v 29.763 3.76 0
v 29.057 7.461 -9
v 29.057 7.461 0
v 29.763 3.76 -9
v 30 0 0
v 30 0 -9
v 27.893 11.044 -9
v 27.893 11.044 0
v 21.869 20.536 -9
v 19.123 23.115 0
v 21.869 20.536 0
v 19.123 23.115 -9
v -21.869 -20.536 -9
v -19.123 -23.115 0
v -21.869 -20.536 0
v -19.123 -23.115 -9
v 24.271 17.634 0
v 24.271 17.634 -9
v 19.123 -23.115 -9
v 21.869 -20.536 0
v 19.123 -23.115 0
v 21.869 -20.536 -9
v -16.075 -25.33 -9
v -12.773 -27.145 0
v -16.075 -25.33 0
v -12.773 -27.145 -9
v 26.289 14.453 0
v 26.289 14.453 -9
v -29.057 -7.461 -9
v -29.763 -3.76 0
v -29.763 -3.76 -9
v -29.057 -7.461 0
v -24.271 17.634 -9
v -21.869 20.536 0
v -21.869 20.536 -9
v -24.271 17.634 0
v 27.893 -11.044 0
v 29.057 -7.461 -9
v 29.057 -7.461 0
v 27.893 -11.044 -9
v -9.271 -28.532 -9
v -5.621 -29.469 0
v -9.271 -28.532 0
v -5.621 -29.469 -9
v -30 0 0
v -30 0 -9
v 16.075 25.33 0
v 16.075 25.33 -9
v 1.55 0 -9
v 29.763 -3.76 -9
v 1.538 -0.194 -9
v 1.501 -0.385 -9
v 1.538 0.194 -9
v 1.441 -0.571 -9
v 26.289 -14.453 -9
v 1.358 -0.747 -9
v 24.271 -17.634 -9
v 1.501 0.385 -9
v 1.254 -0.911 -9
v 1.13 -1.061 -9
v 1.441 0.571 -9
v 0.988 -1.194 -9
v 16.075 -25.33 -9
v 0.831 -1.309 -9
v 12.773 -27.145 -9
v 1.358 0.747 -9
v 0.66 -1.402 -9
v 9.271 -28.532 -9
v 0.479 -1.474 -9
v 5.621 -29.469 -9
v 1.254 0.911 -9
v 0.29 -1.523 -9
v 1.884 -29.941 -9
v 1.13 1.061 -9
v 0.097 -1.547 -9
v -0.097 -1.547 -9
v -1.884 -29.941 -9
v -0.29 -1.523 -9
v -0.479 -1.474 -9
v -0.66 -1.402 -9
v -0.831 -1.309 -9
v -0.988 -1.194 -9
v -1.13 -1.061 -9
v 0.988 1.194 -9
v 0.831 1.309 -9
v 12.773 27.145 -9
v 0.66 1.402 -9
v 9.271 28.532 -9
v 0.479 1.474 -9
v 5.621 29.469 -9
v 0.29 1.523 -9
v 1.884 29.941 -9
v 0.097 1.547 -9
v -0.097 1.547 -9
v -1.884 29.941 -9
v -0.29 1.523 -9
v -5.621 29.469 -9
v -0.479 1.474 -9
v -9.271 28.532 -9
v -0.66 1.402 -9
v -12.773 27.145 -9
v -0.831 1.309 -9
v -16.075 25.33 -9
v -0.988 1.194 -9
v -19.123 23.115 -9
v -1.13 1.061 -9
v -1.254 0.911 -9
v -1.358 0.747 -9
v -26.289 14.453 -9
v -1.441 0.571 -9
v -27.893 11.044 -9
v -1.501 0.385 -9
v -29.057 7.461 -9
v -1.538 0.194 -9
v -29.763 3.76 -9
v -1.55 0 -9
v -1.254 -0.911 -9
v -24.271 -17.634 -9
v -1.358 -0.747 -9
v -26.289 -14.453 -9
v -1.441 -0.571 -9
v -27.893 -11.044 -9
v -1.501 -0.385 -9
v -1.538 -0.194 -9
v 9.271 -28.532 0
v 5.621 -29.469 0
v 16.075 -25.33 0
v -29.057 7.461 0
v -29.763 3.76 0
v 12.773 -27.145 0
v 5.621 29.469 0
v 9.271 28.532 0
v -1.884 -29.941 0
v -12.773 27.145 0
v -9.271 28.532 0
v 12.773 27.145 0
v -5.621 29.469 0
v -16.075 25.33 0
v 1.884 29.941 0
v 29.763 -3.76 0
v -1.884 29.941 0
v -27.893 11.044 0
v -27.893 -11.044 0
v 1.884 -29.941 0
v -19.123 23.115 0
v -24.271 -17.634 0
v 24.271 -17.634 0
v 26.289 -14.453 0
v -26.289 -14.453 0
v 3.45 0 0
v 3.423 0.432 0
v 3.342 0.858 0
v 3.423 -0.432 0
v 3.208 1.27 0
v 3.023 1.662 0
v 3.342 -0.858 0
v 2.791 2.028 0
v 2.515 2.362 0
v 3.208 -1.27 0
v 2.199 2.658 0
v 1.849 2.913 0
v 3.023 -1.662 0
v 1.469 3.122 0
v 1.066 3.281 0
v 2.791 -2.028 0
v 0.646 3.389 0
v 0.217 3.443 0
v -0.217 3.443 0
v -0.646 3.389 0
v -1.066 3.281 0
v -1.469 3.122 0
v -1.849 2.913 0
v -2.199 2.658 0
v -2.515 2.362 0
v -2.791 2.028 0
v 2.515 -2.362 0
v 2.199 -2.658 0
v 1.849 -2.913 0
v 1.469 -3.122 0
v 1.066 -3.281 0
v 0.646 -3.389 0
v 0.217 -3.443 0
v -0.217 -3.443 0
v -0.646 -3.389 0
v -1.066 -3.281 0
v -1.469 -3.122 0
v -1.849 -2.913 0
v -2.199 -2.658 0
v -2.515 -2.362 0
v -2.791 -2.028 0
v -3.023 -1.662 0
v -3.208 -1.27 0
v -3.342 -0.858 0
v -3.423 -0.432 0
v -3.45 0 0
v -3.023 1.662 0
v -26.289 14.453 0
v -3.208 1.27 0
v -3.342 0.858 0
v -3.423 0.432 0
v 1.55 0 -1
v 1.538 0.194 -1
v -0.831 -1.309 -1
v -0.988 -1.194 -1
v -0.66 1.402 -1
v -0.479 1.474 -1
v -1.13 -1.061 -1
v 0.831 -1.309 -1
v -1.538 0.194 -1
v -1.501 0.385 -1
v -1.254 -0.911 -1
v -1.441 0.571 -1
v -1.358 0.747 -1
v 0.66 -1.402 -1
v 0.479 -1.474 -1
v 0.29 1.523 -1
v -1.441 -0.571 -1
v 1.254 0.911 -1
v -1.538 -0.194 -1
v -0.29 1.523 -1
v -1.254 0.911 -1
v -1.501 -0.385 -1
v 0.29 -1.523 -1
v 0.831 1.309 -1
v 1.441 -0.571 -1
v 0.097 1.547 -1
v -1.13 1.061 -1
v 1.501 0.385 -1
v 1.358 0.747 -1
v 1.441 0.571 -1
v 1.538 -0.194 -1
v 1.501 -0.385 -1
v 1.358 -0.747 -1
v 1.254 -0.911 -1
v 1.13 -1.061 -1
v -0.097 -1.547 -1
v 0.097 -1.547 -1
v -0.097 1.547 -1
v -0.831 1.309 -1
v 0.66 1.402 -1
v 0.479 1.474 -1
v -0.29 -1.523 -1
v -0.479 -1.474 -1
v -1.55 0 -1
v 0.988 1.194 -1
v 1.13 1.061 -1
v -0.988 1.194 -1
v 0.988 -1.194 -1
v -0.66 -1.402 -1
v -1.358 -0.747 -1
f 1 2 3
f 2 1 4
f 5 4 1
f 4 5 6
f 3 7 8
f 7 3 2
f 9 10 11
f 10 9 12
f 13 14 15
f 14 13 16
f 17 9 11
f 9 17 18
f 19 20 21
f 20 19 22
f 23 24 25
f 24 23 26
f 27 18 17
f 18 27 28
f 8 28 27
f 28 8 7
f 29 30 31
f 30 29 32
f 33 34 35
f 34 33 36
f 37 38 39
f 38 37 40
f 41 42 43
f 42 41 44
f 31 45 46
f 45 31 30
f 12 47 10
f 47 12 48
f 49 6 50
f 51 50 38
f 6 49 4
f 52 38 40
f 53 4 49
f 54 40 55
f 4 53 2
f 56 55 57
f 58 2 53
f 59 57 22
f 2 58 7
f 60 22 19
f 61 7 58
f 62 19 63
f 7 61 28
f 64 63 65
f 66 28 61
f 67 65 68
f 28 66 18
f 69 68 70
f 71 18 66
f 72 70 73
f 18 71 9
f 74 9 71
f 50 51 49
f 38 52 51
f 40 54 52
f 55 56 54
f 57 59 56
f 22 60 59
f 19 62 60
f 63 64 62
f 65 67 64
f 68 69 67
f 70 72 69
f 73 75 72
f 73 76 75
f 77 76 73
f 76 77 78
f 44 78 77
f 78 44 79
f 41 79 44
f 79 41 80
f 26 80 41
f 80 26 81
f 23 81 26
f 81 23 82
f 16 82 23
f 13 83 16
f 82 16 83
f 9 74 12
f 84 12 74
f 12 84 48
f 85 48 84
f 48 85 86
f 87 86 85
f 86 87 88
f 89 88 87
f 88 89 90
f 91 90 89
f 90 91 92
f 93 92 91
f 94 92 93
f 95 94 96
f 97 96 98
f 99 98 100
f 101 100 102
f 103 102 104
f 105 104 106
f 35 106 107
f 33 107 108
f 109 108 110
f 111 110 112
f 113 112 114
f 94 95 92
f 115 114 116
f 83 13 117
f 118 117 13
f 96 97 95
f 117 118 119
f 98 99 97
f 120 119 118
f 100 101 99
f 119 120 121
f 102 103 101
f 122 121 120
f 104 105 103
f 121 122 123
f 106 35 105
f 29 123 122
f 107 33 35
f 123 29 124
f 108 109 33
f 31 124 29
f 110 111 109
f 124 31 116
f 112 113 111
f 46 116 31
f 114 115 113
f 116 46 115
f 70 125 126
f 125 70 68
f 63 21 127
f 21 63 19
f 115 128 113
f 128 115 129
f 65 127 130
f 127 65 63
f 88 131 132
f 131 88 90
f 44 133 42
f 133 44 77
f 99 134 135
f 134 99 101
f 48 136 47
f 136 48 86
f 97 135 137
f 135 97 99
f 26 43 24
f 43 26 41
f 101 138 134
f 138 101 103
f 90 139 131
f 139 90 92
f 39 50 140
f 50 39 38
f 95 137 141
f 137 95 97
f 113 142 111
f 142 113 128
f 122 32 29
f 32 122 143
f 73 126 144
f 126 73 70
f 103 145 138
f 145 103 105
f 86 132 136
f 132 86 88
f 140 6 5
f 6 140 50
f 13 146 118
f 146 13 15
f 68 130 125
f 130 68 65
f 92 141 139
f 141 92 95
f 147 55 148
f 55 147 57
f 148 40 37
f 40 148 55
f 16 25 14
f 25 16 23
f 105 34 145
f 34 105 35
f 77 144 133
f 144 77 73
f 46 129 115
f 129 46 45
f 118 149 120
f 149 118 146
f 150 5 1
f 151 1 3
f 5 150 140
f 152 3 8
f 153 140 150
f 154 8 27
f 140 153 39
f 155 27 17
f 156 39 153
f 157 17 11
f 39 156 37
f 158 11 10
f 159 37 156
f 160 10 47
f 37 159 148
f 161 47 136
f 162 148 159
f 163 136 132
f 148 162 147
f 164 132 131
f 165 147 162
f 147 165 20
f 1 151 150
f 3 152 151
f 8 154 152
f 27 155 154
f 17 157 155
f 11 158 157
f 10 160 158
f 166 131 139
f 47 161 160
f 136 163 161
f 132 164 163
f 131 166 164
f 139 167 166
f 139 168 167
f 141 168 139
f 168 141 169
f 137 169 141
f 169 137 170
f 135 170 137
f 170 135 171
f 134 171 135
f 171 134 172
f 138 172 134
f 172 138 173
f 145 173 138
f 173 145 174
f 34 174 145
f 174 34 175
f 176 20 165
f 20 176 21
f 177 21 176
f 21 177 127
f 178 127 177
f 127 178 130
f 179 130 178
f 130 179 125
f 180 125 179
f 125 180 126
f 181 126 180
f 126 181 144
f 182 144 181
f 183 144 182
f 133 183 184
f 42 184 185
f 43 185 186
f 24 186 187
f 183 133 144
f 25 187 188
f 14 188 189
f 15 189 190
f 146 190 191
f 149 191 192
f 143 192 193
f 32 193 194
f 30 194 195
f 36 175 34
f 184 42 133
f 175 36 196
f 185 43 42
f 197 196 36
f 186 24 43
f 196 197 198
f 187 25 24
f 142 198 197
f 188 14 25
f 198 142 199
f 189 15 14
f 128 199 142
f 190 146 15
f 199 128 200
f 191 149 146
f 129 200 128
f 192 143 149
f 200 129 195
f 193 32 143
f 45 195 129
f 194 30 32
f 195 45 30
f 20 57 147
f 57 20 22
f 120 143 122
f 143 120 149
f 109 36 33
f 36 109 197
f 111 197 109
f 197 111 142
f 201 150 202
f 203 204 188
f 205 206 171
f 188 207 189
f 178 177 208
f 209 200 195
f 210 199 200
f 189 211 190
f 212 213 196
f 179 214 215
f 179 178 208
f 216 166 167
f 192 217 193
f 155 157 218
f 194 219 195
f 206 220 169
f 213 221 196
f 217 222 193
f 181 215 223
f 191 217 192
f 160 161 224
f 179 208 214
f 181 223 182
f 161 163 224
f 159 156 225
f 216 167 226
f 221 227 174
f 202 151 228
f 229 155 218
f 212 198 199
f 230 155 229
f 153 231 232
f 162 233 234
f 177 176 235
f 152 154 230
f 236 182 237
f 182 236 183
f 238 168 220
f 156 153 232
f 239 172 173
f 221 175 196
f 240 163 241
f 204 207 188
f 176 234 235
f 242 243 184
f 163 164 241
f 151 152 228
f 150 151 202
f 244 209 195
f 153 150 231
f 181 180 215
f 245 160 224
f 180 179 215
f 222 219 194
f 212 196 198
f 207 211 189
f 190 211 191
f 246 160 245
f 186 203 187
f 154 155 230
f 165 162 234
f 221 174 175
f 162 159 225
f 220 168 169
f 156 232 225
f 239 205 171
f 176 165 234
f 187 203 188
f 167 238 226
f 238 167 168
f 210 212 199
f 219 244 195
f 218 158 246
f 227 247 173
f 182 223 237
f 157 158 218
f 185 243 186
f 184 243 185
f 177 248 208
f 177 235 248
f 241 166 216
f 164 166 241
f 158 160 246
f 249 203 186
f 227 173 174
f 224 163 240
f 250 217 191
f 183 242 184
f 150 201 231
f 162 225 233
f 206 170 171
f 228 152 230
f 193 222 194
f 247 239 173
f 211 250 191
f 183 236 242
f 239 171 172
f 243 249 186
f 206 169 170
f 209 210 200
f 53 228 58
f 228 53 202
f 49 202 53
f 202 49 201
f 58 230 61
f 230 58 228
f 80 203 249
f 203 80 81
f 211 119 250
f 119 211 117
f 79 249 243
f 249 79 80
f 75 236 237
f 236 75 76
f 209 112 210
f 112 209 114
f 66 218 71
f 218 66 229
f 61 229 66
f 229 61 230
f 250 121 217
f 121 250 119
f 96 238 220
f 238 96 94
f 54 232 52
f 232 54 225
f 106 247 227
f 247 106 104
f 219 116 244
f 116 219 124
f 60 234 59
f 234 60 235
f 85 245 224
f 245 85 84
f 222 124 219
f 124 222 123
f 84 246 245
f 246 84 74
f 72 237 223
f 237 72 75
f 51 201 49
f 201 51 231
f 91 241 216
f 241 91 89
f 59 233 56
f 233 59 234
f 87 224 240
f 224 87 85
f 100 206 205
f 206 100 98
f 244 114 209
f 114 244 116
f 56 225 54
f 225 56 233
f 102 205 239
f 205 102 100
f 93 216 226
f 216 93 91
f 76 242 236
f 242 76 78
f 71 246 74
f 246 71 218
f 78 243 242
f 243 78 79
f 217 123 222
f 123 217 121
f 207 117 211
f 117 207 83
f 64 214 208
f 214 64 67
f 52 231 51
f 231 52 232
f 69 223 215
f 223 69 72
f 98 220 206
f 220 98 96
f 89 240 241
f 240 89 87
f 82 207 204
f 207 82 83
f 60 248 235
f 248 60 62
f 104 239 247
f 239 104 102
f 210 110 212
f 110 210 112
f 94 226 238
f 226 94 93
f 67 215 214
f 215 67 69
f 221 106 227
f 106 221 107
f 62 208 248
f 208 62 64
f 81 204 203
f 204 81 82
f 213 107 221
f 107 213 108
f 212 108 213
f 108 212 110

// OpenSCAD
$fn = 50;


difference() {
	union() {
		translate(v = [0, 0, -9.0000000000]) {
			cylinder(h = 9, r = 30.0000000000);
		}
		translate(v = [0, 0, -9.0000000000]) {
			cylinder(h = 9, r = 2.8750000000);
		}
	}
	union() {
		translate(v = [0, 0, 0]) {
			rotate(a = [0, 0, 0]) {
				difference() {
					union() {
						translate(v = [0, 0, -9.0000000000]) {
							cylinder(h = 9, r = 1.2500000000);
						}
						translate(v = [0, 0, -1.0000000000]) {
							cylinder(h = 1.0000000000, r1 = 1.5500000000, r2 = 3.4500000000);
						}
						translate(v = [0, 0, -9.0000000000]) {
							cylinder(h = 9, r = 1.5500000000);
						}
						translate(v = [0, 0, -9.0000000000]) {
							cylinder(h = 9, r = 1.2500000000);
						}
					}
					union();
				}
			}
		}
	}
}
